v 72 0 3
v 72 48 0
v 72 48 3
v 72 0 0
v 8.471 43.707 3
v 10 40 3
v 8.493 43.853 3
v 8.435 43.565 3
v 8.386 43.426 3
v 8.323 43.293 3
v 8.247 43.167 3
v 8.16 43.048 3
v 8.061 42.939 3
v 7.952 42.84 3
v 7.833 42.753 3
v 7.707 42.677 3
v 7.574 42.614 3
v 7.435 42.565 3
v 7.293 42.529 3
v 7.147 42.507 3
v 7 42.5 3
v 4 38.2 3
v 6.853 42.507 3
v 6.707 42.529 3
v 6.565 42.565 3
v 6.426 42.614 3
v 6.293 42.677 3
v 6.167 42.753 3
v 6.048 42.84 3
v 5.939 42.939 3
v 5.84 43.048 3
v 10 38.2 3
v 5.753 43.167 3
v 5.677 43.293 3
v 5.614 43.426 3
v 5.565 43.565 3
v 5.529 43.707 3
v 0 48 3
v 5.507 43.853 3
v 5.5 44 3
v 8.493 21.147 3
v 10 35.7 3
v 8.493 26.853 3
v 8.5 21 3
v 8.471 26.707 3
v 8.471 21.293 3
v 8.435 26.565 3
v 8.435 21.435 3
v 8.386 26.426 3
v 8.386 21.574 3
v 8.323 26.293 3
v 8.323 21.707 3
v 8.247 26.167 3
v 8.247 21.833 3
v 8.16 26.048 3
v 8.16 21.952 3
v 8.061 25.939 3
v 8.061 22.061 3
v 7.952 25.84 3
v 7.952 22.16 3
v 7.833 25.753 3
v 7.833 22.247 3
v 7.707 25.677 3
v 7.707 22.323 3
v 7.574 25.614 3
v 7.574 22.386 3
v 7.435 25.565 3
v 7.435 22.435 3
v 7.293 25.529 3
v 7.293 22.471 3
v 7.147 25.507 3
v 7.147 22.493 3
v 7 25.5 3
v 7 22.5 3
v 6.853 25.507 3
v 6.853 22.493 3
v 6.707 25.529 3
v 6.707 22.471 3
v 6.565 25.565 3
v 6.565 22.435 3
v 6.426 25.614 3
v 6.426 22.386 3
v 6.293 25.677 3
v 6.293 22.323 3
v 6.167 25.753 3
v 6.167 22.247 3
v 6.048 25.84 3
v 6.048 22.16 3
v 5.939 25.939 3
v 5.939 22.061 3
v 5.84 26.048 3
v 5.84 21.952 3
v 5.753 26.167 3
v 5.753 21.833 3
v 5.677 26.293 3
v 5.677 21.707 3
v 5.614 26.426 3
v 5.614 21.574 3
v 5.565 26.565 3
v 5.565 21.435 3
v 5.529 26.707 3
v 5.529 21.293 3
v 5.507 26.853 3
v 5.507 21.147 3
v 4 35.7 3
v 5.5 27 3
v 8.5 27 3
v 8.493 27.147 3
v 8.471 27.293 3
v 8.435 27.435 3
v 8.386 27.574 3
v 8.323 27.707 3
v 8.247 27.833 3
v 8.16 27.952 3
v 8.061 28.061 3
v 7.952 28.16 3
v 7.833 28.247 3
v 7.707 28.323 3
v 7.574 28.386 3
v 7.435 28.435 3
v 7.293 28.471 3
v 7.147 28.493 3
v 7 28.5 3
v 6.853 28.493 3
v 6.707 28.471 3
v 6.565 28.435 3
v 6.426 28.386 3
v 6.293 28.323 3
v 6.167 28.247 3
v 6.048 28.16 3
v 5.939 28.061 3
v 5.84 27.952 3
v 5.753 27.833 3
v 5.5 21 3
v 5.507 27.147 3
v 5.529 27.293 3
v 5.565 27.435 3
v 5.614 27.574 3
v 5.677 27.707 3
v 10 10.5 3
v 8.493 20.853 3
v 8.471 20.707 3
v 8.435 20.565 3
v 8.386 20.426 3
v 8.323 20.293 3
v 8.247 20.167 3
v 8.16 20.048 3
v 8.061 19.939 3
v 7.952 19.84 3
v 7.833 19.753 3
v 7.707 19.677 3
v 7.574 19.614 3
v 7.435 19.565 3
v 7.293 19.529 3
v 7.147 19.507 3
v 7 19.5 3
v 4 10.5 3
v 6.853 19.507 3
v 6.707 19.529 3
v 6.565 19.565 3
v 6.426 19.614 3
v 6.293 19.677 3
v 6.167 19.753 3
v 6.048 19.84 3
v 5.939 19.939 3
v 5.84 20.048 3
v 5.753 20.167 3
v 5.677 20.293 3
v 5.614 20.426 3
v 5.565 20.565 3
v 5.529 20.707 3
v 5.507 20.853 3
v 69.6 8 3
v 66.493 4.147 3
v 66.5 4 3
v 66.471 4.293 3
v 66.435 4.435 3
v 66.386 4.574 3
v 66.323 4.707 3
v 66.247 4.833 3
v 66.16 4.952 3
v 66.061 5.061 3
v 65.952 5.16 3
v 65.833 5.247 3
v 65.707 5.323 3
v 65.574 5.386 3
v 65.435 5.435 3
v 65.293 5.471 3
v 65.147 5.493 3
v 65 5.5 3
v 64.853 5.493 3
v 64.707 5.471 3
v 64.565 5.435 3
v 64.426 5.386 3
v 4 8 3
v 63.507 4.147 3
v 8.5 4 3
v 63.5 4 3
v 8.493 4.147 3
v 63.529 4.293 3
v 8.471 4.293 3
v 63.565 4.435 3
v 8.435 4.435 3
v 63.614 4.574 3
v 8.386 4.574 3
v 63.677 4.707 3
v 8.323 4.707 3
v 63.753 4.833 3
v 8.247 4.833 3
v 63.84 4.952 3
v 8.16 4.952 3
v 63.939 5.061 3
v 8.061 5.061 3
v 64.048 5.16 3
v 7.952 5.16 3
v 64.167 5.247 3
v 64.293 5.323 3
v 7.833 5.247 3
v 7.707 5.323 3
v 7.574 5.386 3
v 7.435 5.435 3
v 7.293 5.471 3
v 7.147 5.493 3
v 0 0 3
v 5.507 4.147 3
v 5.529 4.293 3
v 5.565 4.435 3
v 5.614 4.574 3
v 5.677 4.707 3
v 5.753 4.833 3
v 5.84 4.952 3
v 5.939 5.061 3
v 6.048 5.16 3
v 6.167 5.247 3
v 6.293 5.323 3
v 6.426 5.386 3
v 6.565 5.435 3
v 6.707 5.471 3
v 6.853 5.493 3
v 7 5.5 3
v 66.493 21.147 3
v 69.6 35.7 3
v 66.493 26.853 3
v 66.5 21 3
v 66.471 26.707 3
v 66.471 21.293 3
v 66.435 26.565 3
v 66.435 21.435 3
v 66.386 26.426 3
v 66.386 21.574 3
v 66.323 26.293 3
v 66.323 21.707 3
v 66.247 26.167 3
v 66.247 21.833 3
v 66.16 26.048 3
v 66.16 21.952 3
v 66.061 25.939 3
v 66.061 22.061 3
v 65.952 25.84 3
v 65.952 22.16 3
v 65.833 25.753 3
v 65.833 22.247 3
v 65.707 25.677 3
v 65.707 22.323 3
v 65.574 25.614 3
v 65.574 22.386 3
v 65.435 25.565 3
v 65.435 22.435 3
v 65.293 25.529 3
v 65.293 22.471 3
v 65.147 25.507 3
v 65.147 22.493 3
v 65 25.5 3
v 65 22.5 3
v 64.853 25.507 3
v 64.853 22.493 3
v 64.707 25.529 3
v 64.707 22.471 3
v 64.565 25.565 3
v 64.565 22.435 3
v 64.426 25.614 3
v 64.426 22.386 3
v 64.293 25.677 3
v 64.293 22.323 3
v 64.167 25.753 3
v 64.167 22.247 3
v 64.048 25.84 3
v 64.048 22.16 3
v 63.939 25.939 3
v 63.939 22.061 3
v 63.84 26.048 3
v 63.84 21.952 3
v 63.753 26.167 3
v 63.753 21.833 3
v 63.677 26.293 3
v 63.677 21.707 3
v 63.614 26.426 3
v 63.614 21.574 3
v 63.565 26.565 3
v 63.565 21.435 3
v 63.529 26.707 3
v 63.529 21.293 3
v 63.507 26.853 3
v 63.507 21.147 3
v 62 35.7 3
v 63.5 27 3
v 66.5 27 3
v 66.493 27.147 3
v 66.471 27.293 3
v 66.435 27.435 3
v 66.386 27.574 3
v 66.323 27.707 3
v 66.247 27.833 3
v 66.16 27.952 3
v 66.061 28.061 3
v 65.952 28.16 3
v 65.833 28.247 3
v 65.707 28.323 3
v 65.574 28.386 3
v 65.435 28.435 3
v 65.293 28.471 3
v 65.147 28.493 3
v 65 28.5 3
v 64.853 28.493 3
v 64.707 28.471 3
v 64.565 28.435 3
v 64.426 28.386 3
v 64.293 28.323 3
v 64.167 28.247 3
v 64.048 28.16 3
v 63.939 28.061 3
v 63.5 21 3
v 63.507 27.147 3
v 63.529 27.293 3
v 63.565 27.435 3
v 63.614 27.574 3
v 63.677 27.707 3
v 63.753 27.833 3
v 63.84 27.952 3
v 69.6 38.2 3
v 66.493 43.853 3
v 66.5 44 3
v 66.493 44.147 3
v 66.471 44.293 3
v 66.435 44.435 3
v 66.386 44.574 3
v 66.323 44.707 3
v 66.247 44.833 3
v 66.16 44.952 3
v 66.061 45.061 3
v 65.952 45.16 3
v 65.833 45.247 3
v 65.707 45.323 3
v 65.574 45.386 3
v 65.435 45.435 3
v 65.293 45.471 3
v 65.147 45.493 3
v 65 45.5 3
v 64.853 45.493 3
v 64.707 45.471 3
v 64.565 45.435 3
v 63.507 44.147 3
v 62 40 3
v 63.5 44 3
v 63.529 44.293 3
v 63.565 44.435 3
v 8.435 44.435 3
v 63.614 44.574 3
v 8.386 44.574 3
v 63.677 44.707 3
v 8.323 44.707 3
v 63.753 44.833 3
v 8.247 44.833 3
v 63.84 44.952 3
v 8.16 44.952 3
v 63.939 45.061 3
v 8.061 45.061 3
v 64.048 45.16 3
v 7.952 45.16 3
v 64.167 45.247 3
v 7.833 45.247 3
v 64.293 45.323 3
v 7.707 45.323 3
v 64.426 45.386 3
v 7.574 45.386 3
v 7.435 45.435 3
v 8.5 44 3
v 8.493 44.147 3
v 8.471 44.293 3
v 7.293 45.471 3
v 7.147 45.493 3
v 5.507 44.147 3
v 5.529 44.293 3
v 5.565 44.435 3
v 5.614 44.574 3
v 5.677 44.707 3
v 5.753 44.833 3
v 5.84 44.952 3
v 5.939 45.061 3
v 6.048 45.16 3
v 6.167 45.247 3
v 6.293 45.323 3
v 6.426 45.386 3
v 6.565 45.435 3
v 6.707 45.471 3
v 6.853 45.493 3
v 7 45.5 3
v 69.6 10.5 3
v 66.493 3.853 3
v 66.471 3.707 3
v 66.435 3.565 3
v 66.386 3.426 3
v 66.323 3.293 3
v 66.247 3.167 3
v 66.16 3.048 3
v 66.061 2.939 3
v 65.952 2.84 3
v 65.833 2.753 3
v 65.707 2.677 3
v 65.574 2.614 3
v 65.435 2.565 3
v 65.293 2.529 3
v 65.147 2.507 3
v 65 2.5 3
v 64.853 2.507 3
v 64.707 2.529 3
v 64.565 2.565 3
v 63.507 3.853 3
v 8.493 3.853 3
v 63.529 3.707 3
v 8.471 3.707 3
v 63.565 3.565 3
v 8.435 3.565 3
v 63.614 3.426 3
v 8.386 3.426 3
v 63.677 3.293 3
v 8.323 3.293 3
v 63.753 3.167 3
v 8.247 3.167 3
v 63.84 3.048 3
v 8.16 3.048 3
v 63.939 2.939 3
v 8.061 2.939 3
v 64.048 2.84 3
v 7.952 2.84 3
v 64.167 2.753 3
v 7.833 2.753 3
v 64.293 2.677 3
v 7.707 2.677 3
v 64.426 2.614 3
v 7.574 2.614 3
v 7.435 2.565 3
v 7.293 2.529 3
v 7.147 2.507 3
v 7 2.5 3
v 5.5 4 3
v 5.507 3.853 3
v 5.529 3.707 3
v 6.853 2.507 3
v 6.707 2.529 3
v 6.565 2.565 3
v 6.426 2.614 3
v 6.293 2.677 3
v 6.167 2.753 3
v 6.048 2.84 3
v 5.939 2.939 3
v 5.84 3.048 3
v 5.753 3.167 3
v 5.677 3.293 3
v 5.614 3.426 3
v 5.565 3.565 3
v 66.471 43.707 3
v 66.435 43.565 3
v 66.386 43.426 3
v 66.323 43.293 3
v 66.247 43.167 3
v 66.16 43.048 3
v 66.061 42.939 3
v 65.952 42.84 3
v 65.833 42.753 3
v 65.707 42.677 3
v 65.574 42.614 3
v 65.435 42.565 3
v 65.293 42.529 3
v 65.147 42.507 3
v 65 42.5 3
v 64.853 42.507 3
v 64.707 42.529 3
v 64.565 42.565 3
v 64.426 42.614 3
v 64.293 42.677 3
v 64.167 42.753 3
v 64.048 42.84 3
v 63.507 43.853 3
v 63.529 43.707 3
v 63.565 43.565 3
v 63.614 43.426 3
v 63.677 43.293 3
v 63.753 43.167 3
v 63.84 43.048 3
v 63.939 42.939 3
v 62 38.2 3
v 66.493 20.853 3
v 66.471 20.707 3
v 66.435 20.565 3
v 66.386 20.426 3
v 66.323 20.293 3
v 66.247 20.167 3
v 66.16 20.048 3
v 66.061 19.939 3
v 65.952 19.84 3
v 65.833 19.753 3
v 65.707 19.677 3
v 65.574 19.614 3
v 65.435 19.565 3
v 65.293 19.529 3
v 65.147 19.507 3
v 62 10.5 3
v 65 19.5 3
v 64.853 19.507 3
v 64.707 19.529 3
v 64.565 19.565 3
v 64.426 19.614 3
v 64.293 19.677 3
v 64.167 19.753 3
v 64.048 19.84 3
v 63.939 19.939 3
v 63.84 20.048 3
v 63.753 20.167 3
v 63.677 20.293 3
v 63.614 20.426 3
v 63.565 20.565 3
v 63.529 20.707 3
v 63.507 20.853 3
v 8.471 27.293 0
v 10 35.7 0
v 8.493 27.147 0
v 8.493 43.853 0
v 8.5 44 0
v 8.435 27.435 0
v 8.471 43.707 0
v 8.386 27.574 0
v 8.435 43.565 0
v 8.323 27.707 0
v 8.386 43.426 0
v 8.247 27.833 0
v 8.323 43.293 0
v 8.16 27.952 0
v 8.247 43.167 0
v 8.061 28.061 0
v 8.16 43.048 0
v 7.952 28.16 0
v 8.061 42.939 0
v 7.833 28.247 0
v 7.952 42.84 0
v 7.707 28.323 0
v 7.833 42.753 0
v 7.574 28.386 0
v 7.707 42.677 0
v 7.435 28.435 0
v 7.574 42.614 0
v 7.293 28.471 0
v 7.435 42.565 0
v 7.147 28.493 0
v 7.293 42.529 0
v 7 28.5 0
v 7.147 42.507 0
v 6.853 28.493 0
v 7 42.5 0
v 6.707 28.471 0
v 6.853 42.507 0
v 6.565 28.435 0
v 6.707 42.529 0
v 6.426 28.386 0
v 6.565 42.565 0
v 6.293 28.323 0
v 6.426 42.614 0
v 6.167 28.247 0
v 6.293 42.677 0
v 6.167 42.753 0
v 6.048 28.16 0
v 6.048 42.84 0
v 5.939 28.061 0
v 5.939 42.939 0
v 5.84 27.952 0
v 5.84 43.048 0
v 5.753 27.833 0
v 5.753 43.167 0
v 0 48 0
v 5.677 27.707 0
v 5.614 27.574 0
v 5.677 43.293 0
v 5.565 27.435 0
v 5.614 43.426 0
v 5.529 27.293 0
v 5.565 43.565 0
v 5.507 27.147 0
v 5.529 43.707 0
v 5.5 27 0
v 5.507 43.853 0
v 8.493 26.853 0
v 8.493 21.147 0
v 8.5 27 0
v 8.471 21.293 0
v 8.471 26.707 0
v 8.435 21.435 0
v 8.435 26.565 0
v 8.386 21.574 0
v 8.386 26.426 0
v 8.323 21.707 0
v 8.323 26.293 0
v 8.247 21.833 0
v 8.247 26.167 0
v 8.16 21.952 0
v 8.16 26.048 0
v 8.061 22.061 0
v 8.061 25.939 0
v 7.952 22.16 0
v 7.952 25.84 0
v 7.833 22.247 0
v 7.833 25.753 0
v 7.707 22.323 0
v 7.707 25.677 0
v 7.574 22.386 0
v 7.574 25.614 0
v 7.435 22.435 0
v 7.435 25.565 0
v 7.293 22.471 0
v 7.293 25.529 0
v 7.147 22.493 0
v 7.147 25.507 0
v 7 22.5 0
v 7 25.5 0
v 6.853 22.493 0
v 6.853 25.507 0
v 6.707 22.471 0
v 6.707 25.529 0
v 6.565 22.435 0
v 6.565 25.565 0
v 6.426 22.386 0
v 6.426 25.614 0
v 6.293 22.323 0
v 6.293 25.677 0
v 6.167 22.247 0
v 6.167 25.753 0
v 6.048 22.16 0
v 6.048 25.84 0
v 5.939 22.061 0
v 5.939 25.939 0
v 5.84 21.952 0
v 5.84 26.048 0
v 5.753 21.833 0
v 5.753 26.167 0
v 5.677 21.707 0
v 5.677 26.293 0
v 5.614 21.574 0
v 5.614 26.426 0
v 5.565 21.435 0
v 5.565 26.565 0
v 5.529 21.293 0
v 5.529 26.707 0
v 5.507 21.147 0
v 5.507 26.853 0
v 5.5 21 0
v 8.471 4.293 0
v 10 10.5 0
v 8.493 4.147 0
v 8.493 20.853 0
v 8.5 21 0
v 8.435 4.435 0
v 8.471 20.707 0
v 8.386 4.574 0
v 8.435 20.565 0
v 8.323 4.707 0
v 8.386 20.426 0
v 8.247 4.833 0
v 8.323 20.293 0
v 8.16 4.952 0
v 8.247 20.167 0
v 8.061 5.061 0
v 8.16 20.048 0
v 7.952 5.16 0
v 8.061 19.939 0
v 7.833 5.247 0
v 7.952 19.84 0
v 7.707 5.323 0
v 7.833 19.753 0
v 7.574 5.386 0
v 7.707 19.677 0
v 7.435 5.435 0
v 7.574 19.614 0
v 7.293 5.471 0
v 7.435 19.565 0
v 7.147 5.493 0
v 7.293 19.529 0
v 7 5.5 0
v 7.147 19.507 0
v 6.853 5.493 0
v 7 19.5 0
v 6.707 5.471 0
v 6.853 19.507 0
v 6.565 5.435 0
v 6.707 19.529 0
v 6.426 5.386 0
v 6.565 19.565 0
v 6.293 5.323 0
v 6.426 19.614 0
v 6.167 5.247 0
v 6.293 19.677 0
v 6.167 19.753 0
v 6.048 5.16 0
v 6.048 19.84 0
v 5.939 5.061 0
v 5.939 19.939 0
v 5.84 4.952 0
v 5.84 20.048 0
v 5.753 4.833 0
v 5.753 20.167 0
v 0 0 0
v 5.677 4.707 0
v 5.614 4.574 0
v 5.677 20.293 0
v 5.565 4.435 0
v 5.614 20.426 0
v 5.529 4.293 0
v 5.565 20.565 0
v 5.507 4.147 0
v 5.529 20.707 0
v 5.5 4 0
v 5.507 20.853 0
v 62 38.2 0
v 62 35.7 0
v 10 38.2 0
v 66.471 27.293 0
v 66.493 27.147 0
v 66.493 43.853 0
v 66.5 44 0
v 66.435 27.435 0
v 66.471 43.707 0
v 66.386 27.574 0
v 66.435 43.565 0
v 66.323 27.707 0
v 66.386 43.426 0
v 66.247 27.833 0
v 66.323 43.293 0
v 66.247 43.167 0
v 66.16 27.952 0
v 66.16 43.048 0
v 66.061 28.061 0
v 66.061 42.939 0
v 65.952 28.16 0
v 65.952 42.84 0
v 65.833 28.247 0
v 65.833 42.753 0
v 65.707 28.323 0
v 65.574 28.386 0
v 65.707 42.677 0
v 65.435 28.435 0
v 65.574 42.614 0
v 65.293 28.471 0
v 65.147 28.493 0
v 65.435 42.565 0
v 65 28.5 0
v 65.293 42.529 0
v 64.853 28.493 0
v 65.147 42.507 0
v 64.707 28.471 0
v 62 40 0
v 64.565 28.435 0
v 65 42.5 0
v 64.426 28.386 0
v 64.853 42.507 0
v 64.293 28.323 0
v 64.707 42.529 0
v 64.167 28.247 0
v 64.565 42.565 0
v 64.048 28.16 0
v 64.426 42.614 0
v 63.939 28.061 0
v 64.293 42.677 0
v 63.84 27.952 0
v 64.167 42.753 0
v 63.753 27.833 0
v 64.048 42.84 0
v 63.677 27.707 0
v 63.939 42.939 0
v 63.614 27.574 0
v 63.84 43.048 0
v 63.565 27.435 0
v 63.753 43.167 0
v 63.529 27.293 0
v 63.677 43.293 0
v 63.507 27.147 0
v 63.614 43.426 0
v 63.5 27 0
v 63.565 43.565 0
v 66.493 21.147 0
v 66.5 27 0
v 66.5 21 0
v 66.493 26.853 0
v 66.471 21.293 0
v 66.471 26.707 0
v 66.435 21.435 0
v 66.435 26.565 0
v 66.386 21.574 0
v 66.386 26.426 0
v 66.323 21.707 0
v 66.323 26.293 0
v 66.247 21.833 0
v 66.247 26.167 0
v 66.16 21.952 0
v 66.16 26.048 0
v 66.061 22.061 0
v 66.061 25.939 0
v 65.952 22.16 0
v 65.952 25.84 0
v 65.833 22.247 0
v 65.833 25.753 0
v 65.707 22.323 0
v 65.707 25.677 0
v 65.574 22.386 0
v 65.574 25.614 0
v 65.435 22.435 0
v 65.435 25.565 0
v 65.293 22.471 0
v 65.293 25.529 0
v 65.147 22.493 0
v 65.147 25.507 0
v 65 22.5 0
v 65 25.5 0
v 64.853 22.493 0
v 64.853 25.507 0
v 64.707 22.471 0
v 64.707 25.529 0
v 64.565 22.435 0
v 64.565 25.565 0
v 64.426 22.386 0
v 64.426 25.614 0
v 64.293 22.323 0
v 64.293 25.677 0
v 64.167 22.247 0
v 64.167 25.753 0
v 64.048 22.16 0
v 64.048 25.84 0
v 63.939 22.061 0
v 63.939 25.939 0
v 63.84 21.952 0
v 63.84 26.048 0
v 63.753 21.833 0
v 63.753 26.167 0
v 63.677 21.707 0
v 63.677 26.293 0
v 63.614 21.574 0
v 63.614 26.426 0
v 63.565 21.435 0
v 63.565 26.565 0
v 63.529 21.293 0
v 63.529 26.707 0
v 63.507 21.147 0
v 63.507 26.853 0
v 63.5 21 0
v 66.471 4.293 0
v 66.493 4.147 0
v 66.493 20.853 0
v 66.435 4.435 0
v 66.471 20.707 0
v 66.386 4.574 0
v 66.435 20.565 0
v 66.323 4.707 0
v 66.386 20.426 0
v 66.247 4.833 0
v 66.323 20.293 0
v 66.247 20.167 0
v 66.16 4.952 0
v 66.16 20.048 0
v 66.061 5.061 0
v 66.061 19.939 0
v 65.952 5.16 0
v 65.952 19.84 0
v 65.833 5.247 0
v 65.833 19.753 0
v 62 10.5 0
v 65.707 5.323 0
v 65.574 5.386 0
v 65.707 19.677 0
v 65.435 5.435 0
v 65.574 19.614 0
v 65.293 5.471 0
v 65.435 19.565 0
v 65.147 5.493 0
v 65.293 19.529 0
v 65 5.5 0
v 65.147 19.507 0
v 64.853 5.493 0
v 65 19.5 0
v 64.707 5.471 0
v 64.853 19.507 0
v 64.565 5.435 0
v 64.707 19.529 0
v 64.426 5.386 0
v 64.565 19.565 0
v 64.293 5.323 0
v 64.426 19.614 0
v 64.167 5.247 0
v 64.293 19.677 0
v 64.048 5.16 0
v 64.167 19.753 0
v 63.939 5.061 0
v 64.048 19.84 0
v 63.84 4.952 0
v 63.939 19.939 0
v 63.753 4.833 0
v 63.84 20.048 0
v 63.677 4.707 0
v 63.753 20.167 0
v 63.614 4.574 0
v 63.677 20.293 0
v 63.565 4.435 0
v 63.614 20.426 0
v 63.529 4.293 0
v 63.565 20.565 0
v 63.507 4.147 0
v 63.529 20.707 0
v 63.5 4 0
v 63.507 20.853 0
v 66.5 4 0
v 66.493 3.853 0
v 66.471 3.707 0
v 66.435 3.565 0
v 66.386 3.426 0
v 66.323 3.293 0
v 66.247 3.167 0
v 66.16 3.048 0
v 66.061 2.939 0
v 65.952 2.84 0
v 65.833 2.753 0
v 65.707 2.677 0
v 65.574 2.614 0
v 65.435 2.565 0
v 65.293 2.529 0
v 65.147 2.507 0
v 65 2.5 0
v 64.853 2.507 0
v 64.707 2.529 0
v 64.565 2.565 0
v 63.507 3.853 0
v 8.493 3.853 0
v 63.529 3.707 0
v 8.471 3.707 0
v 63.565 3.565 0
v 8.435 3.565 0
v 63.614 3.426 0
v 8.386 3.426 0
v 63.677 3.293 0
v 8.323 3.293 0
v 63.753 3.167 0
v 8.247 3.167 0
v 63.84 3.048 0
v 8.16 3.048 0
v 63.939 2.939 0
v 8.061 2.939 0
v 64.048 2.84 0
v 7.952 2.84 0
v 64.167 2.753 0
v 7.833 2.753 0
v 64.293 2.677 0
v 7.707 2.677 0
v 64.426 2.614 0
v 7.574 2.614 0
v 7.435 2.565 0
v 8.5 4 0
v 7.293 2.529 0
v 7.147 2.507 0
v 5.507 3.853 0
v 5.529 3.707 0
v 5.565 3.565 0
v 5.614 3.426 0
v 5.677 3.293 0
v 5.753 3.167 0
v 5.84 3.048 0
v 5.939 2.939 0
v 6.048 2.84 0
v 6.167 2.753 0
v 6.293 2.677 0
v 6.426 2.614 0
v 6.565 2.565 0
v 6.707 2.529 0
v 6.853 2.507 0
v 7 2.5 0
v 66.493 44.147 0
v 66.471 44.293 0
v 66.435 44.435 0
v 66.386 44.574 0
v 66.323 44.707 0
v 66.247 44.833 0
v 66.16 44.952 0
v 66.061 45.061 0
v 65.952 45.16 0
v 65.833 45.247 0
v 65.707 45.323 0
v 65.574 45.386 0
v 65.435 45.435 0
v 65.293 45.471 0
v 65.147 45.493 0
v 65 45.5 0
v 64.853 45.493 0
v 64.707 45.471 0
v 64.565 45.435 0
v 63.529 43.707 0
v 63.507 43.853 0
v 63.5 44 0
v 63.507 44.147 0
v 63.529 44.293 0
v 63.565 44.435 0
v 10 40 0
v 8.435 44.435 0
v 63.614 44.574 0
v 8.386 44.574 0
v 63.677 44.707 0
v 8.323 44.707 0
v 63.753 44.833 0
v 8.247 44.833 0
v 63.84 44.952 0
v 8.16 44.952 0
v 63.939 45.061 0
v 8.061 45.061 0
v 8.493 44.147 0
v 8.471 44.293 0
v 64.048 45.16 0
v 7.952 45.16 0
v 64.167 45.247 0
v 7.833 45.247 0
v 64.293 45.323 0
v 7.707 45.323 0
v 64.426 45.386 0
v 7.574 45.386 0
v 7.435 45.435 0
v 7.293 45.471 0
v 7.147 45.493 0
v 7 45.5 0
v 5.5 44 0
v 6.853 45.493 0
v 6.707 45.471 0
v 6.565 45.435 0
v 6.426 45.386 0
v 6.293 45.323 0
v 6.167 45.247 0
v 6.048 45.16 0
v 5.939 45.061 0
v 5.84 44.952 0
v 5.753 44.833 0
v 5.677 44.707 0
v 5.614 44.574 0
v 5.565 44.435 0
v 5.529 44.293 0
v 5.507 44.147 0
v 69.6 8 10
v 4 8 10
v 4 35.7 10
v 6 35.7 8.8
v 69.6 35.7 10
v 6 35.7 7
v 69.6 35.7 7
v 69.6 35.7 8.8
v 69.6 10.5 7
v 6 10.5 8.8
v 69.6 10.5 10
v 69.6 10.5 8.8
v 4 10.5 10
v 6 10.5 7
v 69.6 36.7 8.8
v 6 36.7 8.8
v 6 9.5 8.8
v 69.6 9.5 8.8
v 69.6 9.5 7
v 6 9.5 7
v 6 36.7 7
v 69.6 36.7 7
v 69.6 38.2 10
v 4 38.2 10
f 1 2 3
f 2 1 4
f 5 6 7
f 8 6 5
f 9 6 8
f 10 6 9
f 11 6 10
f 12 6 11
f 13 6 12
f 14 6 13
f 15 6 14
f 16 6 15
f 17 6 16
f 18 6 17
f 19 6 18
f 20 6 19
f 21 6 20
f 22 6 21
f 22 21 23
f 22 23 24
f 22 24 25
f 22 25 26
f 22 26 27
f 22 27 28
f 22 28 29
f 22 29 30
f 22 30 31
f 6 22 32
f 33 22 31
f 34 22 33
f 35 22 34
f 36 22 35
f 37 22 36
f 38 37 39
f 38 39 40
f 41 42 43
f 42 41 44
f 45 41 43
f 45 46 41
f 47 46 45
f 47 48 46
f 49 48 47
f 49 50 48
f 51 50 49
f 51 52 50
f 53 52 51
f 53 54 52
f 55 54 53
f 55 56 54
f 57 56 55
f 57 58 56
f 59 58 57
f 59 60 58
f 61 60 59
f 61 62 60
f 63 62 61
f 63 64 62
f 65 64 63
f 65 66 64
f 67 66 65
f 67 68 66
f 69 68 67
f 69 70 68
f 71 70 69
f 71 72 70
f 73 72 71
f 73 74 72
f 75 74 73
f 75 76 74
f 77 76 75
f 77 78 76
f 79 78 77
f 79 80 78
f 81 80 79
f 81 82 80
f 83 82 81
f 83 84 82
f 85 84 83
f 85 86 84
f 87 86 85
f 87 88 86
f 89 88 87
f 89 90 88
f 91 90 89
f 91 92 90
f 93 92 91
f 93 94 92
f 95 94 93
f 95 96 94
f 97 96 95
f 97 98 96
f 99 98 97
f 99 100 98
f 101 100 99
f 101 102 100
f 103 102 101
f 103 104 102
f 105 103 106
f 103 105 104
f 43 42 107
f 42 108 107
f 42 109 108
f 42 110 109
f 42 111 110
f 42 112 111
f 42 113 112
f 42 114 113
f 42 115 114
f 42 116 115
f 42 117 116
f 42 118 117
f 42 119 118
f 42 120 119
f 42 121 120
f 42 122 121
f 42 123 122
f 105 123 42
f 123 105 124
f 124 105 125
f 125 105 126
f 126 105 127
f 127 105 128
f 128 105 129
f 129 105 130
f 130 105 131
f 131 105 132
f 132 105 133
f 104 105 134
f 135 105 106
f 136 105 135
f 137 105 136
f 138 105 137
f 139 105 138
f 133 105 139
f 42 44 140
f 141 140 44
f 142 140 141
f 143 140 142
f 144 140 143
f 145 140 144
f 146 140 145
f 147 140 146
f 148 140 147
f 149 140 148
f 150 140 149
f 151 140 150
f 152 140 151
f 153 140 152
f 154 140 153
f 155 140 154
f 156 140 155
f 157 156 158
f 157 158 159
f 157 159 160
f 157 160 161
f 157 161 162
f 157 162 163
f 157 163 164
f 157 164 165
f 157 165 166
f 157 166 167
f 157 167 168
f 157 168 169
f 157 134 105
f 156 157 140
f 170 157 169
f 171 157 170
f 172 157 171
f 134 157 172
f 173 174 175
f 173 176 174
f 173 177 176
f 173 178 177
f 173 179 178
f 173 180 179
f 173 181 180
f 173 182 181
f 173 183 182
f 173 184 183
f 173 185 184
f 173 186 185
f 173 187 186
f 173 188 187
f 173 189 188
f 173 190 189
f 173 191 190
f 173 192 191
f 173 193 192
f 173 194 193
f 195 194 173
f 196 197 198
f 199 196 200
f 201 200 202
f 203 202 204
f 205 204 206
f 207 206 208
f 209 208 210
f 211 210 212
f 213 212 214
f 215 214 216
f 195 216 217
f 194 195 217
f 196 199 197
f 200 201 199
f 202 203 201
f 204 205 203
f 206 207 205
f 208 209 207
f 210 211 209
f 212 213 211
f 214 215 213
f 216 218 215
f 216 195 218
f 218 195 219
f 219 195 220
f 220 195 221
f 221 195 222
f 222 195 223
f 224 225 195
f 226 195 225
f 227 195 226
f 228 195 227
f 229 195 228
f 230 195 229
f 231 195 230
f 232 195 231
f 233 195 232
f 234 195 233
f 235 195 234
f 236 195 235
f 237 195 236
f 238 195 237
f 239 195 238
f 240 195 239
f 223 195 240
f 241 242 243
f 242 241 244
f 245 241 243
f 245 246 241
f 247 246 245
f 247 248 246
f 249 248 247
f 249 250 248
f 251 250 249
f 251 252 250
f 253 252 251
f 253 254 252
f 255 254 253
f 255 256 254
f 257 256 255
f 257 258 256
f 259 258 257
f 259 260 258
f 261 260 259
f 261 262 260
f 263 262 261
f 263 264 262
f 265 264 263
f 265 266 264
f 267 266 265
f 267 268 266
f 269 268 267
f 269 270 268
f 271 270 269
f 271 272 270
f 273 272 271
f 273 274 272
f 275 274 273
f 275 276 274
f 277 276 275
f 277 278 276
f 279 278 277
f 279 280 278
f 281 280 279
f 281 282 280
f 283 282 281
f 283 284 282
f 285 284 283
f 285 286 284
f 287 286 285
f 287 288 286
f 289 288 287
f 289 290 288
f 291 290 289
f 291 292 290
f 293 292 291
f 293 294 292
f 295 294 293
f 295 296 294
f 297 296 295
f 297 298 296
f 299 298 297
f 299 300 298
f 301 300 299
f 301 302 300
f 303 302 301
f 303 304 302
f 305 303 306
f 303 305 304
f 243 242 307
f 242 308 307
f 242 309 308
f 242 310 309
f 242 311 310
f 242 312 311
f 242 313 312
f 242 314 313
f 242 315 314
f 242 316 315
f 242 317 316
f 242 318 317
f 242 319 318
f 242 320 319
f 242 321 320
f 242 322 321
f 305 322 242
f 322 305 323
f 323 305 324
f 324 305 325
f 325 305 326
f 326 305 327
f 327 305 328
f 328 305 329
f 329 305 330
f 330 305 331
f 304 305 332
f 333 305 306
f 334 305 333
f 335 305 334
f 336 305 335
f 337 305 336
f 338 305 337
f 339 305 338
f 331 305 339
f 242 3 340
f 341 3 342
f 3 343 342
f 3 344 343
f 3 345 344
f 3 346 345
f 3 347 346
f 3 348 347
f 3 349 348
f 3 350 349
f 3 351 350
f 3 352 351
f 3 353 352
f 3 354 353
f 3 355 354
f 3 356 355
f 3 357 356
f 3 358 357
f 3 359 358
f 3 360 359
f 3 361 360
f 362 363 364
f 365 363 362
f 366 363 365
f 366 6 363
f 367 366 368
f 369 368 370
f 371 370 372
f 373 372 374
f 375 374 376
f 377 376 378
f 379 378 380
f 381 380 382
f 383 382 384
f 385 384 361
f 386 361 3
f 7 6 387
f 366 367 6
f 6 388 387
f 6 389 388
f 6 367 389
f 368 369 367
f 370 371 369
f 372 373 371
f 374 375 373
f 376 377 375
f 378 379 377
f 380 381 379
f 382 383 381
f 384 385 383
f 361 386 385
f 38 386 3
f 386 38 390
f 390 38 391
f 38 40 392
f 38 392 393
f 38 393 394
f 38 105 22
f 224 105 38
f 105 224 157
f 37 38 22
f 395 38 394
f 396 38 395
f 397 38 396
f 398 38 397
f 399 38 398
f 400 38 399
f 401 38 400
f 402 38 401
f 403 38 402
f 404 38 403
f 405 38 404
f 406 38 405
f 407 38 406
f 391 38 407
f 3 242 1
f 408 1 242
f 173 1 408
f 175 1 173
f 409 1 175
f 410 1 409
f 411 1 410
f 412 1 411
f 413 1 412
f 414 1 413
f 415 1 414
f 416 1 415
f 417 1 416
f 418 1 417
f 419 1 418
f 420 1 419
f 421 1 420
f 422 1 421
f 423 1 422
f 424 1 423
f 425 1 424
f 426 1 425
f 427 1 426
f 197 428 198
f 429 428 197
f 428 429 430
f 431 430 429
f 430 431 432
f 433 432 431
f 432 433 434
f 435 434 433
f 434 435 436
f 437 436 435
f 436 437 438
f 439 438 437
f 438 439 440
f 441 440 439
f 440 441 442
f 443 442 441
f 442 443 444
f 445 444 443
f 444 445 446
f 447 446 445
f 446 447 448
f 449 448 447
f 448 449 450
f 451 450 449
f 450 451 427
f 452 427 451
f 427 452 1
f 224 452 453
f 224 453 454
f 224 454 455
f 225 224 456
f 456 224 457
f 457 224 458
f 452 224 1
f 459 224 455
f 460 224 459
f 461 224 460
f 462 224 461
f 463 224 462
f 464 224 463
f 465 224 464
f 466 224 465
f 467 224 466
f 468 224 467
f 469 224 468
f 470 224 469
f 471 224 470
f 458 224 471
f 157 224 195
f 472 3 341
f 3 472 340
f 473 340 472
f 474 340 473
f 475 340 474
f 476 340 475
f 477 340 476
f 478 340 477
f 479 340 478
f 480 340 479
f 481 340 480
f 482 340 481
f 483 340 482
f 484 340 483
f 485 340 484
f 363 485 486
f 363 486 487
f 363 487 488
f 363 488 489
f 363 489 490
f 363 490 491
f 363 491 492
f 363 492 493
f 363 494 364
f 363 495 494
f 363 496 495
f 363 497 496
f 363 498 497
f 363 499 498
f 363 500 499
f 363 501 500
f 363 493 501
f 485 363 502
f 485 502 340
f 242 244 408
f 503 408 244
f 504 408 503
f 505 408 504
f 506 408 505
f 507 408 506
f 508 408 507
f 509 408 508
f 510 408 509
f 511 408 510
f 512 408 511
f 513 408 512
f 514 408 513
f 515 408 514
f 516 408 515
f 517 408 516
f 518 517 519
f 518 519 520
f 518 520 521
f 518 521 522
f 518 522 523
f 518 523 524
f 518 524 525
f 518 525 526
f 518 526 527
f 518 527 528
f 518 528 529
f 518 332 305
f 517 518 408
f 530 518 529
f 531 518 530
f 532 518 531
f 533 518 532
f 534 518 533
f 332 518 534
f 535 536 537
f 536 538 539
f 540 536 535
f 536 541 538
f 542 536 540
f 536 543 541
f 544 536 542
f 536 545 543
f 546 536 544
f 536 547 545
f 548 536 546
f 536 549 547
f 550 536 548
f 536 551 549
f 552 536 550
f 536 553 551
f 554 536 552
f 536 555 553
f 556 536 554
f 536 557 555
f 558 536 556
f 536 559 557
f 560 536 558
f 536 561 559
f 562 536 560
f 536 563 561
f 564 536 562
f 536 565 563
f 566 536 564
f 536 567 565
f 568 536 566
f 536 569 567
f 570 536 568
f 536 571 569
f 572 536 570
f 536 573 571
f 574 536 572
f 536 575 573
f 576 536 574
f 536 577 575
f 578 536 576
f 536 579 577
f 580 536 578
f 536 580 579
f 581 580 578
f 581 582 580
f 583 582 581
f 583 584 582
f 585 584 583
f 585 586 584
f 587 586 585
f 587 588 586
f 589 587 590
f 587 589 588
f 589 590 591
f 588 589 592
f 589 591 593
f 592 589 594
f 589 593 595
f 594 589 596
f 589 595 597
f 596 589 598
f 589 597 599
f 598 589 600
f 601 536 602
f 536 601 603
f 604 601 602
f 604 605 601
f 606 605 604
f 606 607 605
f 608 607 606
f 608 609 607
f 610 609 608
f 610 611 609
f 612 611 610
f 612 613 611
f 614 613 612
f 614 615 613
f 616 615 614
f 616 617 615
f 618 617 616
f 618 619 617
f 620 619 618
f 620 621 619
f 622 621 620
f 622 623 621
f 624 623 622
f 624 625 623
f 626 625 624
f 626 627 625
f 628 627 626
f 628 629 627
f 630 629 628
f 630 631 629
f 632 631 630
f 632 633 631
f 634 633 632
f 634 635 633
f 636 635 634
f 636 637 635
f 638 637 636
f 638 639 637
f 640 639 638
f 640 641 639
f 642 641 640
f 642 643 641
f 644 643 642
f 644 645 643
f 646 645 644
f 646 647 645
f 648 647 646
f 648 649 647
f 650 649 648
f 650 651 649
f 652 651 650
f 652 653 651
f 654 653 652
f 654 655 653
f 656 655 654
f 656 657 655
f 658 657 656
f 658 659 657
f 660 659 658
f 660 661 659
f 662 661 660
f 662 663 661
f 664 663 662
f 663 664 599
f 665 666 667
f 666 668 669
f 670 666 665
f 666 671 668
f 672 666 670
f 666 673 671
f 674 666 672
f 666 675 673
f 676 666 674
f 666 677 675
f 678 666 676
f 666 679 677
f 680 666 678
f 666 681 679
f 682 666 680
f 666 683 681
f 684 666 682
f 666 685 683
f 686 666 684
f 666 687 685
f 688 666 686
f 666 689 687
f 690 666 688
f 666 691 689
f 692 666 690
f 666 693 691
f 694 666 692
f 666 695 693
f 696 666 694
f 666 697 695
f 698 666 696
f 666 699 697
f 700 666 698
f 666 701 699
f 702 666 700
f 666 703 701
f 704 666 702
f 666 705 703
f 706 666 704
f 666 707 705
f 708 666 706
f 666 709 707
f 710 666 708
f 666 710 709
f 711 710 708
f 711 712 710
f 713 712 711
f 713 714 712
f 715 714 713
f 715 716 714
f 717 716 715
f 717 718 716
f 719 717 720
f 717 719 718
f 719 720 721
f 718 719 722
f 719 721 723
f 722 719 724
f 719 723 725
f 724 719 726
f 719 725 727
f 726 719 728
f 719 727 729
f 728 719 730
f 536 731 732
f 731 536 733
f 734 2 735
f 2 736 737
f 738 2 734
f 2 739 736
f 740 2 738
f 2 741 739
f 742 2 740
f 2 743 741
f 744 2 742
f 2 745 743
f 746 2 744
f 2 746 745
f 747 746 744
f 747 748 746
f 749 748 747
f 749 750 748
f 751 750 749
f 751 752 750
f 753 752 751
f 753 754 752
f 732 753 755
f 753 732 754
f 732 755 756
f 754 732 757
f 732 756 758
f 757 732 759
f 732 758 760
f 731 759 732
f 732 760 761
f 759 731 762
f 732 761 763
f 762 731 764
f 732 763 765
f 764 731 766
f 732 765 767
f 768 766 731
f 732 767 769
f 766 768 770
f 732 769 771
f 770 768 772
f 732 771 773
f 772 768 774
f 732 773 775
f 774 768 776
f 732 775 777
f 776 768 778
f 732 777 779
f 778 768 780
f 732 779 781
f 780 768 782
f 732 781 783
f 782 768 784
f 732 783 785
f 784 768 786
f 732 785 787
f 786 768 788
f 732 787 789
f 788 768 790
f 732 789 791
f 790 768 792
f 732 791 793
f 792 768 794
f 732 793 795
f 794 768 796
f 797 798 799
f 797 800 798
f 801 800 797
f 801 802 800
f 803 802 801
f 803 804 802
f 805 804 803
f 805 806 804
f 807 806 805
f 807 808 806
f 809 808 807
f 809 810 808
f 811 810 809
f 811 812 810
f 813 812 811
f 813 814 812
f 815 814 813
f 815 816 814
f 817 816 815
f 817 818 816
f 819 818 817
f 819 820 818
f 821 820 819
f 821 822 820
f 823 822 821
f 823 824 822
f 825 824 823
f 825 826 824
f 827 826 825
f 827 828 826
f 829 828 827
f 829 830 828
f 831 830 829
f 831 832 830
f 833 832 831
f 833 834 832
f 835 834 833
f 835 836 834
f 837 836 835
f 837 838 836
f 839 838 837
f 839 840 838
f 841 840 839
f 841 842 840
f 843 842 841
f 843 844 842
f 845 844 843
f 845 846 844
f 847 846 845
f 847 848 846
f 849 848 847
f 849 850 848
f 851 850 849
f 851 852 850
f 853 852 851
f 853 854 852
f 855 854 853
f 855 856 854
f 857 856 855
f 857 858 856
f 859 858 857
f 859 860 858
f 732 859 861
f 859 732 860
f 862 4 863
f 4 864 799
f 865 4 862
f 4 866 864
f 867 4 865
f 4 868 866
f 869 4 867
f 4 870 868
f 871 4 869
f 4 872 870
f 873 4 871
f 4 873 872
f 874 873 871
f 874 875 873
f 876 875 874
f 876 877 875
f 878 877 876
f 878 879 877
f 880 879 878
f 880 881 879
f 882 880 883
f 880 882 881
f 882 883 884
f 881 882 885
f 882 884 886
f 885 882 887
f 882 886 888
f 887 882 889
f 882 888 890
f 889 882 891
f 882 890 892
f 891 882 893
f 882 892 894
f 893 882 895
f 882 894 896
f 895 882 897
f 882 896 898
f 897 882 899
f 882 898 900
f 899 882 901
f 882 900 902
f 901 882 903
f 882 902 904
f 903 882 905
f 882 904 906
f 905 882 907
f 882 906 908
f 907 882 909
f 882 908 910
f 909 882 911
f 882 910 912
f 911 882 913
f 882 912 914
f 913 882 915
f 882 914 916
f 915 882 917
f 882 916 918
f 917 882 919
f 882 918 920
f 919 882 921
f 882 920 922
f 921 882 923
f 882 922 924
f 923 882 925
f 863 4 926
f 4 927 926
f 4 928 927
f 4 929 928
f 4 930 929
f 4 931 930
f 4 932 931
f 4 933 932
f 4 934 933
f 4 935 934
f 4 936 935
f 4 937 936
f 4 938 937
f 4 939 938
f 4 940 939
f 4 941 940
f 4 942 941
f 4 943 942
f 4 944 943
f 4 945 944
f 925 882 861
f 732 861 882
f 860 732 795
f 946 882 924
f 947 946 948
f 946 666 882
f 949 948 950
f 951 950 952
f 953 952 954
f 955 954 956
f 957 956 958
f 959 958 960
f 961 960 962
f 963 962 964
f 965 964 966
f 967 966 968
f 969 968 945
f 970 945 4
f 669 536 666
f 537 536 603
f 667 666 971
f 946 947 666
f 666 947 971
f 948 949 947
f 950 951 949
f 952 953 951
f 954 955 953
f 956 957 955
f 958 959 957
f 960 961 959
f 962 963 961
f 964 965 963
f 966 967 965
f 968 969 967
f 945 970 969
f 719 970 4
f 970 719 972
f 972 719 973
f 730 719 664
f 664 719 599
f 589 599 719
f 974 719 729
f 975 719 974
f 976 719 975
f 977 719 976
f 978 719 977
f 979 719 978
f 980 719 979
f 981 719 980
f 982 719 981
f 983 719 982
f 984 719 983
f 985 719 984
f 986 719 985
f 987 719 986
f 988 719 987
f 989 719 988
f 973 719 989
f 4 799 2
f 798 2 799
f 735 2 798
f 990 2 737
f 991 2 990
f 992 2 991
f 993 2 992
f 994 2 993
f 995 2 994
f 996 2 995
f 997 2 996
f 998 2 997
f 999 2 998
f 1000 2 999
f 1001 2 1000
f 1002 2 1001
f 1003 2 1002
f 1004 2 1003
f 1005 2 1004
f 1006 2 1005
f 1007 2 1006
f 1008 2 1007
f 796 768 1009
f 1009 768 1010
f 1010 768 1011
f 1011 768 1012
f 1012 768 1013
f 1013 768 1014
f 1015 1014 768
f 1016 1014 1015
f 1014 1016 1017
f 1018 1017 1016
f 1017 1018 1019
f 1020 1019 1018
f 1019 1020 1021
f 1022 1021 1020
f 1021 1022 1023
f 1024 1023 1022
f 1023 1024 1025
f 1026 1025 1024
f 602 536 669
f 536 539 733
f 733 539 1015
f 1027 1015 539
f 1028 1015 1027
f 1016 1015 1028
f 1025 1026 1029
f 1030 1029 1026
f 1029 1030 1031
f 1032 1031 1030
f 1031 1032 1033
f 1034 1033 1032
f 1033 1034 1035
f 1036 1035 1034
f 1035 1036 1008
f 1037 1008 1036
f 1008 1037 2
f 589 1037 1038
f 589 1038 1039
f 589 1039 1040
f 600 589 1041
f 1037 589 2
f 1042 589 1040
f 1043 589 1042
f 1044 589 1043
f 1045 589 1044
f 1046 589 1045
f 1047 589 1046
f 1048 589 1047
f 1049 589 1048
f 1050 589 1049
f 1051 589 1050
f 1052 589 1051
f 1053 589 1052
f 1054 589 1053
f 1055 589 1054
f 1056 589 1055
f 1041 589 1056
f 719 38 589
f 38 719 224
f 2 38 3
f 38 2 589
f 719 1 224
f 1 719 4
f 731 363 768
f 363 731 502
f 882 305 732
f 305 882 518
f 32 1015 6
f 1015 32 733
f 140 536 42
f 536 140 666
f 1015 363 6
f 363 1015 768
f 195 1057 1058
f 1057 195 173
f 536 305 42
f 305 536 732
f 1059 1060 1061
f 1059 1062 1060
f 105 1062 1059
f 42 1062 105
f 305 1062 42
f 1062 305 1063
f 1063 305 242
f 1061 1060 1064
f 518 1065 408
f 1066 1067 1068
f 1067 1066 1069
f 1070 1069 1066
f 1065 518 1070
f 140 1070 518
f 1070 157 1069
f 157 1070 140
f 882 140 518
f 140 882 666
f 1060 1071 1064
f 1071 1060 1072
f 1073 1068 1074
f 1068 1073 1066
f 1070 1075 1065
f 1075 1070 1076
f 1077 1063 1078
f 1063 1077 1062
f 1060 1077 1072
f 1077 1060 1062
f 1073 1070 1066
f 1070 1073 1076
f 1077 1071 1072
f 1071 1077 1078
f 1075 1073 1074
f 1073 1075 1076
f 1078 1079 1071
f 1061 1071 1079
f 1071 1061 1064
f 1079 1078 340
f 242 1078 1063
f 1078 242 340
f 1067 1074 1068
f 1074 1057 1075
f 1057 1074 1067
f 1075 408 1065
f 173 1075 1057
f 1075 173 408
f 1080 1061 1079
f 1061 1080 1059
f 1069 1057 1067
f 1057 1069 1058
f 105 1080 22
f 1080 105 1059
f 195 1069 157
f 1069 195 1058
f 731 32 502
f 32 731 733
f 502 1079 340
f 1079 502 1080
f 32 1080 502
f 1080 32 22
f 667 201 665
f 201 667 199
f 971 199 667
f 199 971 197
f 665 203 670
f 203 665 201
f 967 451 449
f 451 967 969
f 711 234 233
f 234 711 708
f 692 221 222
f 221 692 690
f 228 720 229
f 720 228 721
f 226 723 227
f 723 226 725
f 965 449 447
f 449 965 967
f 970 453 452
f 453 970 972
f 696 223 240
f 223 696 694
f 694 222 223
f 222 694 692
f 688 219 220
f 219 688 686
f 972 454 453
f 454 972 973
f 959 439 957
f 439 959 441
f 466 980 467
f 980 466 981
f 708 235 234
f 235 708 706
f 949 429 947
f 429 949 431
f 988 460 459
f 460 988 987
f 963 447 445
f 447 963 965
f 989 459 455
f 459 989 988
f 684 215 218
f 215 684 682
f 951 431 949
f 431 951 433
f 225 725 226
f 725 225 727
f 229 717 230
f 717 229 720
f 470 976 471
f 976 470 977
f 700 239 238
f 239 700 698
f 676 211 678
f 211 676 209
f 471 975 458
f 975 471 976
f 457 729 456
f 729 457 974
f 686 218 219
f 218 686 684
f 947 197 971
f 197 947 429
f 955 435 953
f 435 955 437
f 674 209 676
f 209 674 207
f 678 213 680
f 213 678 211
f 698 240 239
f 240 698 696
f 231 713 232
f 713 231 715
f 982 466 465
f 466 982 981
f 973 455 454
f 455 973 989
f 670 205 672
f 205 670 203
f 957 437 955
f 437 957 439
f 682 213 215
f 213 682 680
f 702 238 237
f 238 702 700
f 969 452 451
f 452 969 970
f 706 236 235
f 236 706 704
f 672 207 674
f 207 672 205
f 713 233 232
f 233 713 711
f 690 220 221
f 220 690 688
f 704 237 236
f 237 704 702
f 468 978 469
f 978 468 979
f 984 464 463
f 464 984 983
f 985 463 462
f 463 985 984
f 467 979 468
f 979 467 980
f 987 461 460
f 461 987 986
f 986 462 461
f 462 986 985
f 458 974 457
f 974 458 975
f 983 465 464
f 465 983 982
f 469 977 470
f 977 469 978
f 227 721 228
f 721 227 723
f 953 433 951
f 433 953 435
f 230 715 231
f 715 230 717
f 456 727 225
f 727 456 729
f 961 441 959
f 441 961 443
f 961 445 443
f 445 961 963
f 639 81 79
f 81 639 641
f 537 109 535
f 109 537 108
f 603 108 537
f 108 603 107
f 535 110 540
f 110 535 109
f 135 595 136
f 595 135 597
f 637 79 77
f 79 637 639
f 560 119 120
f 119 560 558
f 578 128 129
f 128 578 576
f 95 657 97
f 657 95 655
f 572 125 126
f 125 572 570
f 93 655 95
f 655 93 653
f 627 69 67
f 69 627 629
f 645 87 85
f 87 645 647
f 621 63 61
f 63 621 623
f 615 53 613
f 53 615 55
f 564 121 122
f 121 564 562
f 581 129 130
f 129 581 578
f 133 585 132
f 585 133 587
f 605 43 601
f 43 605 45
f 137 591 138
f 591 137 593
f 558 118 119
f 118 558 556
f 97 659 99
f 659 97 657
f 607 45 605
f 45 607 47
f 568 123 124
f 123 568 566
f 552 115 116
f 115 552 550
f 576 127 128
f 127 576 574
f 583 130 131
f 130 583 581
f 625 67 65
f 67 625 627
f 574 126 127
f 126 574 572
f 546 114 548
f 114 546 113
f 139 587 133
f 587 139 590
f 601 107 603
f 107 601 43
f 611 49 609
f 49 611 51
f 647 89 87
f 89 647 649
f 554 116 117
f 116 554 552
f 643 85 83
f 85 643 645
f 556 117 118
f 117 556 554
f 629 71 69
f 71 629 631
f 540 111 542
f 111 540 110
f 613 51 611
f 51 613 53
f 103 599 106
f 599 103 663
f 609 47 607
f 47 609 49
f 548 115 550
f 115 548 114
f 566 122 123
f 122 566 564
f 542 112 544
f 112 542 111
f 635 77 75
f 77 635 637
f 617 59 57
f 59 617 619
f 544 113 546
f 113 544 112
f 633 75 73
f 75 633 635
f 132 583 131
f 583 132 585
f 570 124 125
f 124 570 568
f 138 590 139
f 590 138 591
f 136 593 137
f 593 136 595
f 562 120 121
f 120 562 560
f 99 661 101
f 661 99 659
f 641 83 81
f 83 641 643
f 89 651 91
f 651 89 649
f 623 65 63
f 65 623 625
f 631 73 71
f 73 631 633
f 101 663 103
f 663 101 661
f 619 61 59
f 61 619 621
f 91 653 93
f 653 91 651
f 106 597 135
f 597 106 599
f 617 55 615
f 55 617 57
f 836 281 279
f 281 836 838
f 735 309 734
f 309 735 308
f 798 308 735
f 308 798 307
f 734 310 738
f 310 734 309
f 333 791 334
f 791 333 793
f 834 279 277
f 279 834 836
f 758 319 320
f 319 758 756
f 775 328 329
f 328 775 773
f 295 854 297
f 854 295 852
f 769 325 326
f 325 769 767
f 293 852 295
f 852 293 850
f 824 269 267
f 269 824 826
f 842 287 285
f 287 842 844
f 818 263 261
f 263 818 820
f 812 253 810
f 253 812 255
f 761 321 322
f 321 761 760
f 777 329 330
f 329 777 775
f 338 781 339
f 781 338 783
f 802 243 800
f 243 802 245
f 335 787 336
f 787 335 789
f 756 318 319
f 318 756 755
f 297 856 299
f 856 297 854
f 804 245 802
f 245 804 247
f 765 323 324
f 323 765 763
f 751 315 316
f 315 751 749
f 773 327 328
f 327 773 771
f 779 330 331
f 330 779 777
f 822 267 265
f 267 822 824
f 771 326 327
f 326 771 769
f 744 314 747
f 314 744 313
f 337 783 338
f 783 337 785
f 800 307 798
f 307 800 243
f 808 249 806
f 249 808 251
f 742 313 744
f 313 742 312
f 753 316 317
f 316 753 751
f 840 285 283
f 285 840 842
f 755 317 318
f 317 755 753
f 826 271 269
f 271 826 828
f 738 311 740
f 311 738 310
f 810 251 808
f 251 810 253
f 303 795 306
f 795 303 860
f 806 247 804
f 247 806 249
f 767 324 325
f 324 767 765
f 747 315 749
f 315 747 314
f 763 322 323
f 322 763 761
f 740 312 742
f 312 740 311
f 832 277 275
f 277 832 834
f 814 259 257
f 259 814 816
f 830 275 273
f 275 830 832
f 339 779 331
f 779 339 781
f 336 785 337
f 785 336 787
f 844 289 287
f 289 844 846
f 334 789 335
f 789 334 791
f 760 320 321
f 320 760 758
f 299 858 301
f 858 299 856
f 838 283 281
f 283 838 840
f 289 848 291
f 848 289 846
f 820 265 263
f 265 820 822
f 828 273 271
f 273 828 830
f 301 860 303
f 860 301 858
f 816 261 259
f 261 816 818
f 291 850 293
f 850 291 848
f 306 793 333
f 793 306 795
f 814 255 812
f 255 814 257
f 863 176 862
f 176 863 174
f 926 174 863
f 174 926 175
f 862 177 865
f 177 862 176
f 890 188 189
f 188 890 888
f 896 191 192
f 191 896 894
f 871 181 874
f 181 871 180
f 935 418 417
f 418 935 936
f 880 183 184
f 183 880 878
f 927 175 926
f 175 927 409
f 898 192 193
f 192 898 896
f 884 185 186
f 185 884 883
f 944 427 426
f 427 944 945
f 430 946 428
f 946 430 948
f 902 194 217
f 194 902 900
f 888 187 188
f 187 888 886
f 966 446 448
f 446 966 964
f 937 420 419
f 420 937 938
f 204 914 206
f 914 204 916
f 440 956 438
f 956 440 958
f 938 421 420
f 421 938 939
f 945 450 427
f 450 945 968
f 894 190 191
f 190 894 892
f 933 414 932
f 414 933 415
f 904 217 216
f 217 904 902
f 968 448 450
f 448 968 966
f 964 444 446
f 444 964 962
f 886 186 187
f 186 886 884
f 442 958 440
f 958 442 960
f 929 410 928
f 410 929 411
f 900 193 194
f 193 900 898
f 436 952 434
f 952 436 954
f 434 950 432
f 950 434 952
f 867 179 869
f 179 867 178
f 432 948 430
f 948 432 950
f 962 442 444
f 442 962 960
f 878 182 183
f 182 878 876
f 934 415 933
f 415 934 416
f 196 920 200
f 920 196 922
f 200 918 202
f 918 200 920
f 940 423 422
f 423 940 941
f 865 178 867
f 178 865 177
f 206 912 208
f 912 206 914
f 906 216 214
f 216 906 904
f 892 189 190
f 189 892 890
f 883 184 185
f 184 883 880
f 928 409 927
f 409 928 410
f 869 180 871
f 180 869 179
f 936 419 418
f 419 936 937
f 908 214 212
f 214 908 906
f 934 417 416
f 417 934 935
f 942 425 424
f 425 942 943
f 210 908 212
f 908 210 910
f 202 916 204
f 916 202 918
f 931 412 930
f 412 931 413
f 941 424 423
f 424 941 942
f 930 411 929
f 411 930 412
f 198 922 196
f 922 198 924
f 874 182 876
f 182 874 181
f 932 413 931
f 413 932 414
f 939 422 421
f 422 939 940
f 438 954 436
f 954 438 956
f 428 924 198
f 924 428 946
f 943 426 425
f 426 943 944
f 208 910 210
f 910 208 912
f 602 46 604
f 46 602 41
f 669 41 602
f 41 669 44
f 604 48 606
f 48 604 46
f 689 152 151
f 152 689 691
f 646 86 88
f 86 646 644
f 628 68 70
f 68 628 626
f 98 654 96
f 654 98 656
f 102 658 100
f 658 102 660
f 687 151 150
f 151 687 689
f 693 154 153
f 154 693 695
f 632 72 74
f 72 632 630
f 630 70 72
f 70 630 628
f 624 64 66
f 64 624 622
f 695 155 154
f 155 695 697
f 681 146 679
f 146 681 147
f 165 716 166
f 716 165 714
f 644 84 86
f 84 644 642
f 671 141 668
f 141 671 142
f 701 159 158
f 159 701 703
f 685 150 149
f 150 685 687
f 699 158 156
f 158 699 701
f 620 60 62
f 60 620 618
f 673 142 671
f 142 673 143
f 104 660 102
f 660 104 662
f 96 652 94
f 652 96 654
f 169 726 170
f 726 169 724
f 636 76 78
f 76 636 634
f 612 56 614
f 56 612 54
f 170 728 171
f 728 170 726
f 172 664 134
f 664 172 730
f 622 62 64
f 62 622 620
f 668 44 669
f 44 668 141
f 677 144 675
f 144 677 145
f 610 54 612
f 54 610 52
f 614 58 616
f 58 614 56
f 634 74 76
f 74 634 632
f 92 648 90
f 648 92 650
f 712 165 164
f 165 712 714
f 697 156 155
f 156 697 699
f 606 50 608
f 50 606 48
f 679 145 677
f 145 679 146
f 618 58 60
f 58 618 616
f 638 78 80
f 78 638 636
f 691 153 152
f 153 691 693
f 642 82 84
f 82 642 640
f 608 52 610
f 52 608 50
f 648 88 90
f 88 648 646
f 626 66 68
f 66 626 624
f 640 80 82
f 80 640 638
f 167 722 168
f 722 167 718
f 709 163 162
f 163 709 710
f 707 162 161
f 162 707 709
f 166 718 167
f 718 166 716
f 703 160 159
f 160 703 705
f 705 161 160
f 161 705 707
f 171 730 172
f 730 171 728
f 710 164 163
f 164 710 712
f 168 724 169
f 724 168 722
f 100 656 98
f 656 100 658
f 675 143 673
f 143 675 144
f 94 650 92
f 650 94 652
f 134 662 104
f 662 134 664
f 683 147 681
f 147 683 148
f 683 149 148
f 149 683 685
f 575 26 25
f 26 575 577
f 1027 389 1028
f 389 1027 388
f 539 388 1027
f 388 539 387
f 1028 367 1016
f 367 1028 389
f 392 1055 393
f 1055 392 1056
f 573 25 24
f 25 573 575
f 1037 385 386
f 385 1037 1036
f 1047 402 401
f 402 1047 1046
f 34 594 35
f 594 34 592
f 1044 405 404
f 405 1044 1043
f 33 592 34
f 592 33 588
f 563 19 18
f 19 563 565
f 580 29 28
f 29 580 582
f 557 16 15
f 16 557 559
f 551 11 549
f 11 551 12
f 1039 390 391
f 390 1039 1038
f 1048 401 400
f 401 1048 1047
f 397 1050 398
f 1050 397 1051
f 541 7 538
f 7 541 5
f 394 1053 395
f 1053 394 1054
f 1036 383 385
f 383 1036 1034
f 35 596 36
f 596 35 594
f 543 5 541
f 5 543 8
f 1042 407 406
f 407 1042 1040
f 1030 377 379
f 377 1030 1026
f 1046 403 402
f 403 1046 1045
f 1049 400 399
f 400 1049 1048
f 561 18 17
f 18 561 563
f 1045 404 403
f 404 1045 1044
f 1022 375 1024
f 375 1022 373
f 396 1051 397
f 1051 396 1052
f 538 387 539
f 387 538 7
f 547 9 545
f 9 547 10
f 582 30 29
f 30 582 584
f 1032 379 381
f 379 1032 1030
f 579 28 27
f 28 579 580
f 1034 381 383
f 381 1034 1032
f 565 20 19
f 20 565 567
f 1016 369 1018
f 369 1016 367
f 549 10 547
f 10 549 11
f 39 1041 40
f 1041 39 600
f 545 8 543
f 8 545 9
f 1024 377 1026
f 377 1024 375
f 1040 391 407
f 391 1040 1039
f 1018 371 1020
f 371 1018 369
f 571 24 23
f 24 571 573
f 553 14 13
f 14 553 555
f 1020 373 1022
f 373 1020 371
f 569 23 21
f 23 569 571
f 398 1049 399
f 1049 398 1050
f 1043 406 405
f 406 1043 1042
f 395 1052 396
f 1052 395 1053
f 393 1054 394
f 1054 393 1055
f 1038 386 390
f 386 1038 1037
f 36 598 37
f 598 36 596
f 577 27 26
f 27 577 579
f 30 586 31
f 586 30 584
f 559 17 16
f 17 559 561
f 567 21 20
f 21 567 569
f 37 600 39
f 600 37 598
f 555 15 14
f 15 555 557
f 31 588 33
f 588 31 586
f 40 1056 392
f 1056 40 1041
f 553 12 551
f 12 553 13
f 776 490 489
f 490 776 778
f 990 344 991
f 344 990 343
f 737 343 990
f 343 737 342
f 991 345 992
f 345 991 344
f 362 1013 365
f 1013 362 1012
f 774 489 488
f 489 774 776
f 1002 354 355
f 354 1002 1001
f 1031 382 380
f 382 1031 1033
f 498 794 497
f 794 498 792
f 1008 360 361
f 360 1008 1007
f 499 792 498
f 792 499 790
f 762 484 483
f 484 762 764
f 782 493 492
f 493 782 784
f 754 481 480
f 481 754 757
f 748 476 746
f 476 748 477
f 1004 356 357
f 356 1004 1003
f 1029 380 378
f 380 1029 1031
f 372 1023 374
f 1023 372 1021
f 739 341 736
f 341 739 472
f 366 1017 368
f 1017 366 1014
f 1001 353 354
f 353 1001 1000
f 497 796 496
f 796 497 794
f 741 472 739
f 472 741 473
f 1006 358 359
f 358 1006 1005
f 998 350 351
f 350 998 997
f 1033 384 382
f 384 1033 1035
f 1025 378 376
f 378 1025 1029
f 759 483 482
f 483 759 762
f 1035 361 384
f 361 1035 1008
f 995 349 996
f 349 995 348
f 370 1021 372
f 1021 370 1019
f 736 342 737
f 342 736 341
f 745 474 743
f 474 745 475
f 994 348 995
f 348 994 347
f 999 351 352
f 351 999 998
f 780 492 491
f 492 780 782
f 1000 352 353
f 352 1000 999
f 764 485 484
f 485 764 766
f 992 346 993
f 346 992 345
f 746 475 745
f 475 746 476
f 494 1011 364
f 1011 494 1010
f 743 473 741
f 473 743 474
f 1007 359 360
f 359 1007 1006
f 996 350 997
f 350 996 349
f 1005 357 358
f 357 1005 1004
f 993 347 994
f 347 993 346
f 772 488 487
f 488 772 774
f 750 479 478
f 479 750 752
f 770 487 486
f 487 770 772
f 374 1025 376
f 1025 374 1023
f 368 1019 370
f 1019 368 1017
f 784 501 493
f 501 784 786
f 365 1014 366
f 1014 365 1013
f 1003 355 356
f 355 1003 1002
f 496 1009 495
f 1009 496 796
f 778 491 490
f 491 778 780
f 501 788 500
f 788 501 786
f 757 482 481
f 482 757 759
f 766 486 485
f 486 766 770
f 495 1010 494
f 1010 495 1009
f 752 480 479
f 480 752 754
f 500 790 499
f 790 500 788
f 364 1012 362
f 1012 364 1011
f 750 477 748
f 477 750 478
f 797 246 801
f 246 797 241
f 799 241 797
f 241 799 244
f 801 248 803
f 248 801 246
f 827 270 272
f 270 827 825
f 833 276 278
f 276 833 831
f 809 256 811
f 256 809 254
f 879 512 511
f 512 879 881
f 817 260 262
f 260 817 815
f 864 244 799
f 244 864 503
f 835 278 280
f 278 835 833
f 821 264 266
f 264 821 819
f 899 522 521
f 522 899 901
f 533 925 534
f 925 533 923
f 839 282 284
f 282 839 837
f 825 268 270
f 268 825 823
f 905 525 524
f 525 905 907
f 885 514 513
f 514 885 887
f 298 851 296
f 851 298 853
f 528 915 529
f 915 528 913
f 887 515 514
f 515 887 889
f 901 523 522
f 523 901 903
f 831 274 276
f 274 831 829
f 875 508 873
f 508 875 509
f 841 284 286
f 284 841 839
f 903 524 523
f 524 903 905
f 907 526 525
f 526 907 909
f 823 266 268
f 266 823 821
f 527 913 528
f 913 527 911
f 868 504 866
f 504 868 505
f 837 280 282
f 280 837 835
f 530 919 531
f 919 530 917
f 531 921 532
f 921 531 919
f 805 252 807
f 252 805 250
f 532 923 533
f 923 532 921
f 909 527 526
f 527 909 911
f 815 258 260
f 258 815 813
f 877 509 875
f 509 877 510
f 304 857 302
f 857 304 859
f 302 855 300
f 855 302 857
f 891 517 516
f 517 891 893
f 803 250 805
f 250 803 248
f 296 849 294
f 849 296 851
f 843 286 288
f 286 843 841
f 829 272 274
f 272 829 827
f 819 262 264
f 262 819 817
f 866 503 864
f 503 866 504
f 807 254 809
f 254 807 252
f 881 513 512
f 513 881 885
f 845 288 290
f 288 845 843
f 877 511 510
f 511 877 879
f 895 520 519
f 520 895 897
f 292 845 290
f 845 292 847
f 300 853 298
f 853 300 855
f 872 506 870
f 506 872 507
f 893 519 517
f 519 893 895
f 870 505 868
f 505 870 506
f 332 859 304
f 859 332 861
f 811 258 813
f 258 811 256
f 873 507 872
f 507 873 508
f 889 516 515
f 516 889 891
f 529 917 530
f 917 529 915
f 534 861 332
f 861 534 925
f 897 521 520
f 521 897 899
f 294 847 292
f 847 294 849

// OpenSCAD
// Mount for a Pi Zero and a DROK buck converter
// Gregory A Sanders - Feb, 2025
//
// bs = base
bsx = 72;
bsy = 48;
bsz = 3;
// ps = power supply
psx = 63.6;
psy = 27.2;
psz = 1.8;
// mh = Pi mount hole spacing
mhx = 58;
mhy = 23;
// op = opening in base
opx = 52;
opy = 32;
opz = 10;

$fn=64;



module base(){
    difference(){
        cube([bsx,bsy,bsz]);
        translate([bsx/2,bsy/2,-1])
        cube([opx,opy,opz],true);
    }
}

module ps(){
    difference(){
        cube([psx+2,psy+3,10]);
        translate([-1,3,0])
        difference(){
            union(){
                translate([0,-.5,-0.5])
                cube([psx+4,psy-2,12]);
                translate([3,-1.5,7])
                cube([psx+2,psy,psz]);
            }
        }
    }
}

module picoscrew(){
    union(){
        cylinder(20,r=1.5);
    }
}

module pico(){
    picoscrew();
    translate([0,mhy,0])
    picoscrew();
    translate([mhx,mhy,0])
    picoscrew();
    translate([mhx,0,0])
    picoscrew();
}

difference(){
    union(){
        base();
        translate([4,8,0])
        ps();
    }
    union(){
        translate([bsx/2-mhx/2,4,-.5])
        pico();
        translate([bsx/2-mhx/2,(bsy-mhy)-4,-.5])
        pico();
    }
}
